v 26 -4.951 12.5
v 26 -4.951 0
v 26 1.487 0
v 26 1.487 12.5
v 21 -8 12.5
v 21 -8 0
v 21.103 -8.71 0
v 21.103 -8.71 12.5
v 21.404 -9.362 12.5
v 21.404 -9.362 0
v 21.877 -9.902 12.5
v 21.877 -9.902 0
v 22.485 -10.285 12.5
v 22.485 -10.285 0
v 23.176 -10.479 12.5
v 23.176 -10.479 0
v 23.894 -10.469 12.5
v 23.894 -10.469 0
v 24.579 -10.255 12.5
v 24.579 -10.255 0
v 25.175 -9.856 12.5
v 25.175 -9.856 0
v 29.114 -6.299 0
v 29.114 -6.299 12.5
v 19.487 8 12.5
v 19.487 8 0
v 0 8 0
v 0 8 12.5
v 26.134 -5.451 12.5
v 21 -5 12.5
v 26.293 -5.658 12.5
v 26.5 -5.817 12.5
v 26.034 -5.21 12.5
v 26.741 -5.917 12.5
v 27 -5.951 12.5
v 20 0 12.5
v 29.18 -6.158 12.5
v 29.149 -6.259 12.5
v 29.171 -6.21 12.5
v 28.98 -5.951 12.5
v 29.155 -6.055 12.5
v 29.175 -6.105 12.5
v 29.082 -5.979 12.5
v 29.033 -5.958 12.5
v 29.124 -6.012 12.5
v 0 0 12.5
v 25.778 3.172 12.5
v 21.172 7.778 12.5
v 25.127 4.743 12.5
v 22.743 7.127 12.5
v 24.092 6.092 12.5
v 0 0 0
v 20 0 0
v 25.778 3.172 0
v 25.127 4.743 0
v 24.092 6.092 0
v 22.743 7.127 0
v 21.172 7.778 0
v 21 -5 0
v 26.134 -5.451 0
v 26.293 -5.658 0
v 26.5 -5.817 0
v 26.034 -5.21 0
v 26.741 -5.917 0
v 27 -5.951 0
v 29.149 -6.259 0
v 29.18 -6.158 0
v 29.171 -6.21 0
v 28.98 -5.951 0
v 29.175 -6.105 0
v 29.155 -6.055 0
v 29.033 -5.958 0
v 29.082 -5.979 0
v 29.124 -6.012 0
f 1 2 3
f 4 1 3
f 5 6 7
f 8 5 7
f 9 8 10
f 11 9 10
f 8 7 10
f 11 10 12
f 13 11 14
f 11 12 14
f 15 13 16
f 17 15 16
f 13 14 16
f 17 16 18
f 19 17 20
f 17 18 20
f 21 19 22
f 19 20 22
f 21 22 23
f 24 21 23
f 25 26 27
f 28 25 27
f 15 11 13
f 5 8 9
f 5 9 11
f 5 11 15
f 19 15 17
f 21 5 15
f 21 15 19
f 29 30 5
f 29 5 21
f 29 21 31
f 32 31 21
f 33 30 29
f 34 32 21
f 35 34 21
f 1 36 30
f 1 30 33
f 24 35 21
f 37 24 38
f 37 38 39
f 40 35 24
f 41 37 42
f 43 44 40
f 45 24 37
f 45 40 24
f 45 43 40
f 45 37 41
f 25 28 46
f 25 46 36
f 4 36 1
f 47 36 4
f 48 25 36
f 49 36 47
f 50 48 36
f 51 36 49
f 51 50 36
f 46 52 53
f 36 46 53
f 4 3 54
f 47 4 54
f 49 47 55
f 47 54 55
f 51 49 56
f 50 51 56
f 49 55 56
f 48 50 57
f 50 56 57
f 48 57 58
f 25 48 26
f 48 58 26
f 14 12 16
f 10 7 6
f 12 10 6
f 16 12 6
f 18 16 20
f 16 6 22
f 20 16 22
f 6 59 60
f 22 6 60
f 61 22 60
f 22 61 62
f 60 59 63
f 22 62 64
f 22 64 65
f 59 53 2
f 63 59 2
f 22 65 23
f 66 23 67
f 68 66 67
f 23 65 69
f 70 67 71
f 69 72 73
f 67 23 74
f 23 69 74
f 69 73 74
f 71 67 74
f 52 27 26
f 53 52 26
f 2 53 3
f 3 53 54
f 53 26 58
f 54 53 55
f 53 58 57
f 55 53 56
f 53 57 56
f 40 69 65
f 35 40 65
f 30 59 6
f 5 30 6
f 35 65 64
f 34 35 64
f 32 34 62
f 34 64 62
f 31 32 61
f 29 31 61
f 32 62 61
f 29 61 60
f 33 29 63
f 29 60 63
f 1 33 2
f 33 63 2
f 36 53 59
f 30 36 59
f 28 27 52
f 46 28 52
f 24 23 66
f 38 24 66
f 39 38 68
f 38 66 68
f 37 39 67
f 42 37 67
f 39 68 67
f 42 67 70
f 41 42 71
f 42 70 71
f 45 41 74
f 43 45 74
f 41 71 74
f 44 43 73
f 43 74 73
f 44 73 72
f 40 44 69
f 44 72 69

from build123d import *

# Parameters (mm, degrees)
F1_DEPTH = 12.5


with BuildPart() as f1:
    # F0 (on Top) → F1 (new body)
    with BuildSketch(Plane.XY):
        with BuildLine():
            Line((0, 8), (0, 0))
            Line((0, 0), (20, 0))
            Line((20, 0), (21, -5))
            Line((21, -5), (21, -8))
            ThreePointArc((21, -8), (22.484724, -10.28456), (25.175371, -9.855568))
            Line((25.175371, -9.855568), (29.114077, -6.299355))
            ThreePointArc((29.114077, -6.299355), (29.166714, -6.079108), (28.980047, -5.95091))
            Line((28.980047, -5.95091), (27, -5.95091))
            ThreePointArc((27, -5.95091), (26.292893, -5.658016), (26, -4.95091))
            Line((26, -4.95091), (26, 1.486624))
            ThreePointArc((26, 1.486624), (24.092276, 6.092276), (19.486624, 8))
            Line((19.486624, 8), (0, 8))
        make_face()
    extrude(amount=F1_DEPTH)


solid = f1.part
